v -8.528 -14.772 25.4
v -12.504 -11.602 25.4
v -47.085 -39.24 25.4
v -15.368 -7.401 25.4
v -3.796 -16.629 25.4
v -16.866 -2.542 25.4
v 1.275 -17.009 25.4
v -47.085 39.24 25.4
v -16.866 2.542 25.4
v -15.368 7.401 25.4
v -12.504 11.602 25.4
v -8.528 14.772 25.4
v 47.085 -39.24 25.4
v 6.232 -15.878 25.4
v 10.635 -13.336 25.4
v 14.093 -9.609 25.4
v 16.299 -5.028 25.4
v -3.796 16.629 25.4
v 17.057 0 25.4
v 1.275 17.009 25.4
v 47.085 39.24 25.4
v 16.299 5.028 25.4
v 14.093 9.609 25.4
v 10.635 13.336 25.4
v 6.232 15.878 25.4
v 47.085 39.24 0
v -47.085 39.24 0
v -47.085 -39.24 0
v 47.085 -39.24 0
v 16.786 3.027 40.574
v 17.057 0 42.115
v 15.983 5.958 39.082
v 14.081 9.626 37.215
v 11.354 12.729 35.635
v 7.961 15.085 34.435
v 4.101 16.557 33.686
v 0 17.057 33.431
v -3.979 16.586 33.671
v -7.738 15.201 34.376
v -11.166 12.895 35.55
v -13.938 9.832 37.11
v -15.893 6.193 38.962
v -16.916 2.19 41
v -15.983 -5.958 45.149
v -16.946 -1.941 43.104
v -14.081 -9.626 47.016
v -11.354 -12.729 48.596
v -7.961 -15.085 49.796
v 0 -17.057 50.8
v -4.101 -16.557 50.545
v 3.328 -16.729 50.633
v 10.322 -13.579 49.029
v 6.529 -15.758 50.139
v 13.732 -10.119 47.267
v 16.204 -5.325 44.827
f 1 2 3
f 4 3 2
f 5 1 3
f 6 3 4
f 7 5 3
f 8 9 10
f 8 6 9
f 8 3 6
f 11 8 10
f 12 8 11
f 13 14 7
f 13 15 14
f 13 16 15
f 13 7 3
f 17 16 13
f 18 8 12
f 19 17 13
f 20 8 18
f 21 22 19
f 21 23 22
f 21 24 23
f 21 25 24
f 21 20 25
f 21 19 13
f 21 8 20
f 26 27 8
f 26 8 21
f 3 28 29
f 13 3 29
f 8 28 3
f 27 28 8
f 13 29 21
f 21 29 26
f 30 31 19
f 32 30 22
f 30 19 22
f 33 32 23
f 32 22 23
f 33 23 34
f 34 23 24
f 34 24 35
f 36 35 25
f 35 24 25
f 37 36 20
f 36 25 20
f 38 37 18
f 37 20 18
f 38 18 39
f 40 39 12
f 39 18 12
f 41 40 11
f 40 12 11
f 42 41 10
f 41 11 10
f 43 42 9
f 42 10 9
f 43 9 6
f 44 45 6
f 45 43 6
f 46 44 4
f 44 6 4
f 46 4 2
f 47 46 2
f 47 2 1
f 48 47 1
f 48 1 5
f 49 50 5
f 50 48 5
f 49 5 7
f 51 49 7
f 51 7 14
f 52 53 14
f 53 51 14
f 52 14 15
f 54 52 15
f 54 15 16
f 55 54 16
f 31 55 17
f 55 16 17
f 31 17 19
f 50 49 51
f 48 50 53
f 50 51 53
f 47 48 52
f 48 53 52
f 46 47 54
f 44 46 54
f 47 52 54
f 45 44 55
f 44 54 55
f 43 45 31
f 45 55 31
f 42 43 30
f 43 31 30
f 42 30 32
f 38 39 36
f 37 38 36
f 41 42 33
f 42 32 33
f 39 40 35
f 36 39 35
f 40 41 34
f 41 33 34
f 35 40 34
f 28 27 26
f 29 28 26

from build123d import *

# Parameters (mm, degrees)
F0_W     = 94.170756
F0_H     = 78.479818
F1_DEPTH = 25.4
F2_R     = 17.056969
F3_DEPTH = 25.4
F5_DEPTH = 94.171757


with BuildPart() as f1:
    # F0 (on Top) → F1 (new body)
    with BuildSketch(Plane.XY):
        Rectangle(F0_W, F0_H)
    extrude(amount=F1_DEPTH)

    # F2 (on face) → F3 (join)
    with BuildSketch(Plane.XY.offset(25.4)):
        Circle(F2_R)
    extrude(amount=F3_DEPTH)

    # F4 (on face) → F5 (cut, through all)
    with BuildSketch(Plane.YZ.offset(47.085378)):
        Polygon((17.056969, 50.8), (-17.056969, 50.8), (17.056969, 33.430997), align=None)
    extrude(amount=-F5_DEPTH, mode=Mode.SUBTRACT)


solid = f1.part
